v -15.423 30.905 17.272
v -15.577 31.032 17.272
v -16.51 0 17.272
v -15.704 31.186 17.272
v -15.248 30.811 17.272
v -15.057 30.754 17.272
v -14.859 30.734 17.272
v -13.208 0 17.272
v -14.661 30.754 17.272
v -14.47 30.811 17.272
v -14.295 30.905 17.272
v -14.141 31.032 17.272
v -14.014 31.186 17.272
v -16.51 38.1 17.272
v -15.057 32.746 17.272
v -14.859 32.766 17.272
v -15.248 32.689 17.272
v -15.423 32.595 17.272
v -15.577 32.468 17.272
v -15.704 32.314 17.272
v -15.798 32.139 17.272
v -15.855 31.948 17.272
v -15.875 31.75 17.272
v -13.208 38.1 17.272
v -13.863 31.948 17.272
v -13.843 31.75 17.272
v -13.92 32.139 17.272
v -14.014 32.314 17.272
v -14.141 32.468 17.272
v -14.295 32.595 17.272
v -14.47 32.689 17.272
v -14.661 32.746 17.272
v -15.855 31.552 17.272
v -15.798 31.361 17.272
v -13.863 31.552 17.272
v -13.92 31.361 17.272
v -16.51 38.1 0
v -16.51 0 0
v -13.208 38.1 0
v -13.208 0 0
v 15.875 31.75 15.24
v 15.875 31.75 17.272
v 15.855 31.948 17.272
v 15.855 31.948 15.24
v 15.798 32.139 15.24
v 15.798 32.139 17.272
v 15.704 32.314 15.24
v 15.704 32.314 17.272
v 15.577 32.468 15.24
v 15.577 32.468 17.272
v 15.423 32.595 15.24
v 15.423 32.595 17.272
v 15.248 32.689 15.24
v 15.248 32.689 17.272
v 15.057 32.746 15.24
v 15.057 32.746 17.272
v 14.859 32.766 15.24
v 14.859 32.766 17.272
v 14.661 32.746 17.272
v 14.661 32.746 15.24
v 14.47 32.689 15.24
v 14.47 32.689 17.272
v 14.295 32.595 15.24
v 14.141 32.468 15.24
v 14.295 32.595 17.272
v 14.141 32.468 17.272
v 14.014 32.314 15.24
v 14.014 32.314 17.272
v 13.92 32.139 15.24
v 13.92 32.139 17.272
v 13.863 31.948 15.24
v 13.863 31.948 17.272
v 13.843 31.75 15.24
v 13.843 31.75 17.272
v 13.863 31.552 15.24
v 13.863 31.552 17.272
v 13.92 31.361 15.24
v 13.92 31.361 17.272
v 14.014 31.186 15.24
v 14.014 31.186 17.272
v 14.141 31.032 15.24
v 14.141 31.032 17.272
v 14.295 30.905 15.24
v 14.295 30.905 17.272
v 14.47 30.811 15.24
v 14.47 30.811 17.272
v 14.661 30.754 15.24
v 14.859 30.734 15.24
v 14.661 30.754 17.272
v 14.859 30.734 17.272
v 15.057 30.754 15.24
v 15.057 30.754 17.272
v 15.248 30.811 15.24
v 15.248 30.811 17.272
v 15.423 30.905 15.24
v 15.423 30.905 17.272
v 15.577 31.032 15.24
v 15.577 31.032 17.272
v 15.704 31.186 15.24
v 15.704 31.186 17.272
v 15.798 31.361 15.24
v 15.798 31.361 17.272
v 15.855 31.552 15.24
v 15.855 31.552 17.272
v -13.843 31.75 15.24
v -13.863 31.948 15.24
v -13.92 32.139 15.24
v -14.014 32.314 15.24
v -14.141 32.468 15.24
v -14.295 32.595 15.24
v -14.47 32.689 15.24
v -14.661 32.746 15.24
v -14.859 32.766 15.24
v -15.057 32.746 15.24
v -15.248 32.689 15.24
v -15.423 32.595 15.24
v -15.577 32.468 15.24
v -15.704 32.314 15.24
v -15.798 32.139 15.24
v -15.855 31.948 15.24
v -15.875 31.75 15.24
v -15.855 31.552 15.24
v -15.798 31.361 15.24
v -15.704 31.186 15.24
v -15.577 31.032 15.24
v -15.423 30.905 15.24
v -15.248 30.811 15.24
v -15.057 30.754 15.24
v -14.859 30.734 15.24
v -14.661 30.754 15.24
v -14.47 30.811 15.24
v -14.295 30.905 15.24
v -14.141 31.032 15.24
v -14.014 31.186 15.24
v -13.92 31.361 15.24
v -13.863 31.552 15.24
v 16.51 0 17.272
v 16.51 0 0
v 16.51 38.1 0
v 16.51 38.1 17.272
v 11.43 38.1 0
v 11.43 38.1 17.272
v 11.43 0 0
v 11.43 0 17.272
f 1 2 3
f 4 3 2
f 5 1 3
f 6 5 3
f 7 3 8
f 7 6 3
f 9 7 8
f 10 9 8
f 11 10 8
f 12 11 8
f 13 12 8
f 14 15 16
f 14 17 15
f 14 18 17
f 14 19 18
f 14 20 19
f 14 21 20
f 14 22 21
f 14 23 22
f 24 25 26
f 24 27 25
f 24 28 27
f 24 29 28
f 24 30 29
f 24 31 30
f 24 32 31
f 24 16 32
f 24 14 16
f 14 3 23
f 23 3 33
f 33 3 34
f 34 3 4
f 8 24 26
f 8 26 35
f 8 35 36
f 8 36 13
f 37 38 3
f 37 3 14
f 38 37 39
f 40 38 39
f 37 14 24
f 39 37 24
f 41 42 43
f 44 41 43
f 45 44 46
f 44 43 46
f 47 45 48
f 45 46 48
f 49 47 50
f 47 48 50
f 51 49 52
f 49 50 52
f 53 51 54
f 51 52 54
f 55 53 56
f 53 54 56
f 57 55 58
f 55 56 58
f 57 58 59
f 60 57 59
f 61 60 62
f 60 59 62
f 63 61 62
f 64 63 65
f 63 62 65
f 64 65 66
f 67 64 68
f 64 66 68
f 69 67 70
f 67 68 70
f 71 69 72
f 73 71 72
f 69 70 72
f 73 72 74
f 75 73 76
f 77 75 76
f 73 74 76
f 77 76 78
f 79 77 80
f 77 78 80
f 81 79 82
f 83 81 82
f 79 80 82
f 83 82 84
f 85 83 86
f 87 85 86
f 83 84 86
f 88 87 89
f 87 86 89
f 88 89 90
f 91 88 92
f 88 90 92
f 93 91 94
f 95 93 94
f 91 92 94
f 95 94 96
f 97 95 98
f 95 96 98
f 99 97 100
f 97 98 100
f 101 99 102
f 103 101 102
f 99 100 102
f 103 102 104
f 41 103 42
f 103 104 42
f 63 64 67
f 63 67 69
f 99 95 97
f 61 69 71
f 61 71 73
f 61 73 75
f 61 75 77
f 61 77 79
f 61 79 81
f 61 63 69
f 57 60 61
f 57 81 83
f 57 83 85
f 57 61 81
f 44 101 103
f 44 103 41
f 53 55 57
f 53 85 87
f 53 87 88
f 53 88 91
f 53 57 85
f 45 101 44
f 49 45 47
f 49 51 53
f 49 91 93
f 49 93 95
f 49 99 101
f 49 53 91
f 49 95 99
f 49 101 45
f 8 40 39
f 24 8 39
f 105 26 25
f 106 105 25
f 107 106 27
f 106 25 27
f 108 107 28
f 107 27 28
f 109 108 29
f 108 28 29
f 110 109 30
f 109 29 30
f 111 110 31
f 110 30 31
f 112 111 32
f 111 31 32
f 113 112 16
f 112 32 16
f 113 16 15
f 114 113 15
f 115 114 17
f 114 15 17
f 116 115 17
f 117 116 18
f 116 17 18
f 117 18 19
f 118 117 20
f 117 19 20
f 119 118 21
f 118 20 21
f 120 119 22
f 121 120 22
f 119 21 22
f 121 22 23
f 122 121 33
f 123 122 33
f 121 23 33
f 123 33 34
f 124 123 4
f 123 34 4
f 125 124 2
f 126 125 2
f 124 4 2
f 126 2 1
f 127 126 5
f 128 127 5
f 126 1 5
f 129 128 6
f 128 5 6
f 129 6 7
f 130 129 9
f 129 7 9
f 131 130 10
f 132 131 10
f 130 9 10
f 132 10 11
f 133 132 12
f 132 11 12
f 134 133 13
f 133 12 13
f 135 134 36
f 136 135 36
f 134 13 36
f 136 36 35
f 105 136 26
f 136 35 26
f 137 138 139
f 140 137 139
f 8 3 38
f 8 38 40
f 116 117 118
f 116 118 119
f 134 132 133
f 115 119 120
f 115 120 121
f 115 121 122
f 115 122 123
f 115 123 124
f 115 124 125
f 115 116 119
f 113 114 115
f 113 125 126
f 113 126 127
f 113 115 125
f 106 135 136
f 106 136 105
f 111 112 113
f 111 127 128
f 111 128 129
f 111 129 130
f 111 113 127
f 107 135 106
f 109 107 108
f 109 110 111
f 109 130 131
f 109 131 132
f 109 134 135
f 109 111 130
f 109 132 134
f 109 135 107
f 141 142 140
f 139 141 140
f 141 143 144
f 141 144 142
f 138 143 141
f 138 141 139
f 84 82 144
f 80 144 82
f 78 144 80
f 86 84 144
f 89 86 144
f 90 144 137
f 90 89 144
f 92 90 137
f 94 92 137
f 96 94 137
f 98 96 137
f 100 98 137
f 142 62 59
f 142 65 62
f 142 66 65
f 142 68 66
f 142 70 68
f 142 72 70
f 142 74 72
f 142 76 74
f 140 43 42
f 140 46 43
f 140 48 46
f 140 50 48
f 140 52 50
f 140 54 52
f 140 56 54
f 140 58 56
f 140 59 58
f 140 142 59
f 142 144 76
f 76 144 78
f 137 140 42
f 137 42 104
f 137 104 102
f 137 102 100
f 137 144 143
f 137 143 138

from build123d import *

# Parameters (mm, degrees)
SKETCH2_W             = 3.302
SKETCH2_H             = 38.1
BOSS_EXTRUDE1_DEPTH   = 17.272
SKETCH2_W_2           = 5.08
BOSS_EXTRUDE1_2_DEPTH = 17.272
SKETCH3_R             = 1.016
CUT_EXTRUDE1_DEPTH    = 2.032


with BuildPart() as part:
    # Sketch2 → Boss-Extrude1 (new body)
    with BuildSketch(Plane.XY):
        with Locations((-14.859, 19.05)):
            Rectangle(SKETCH2_W, SKETCH2_H)
    extrude(amount=BOSS_EXTRUDE1_DEPTH)


with BuildPart() as body_2:
    # Sketch2 → Boss-Extrude1 2 (new body)
    with BuildSketch(Plane.XY):
        with Locations((13.97, 19.05)):
            Rectangle(SKETCH2_W_2, SKETCH2_H)
    extrude(amount=BOSS_EXTRUDE1_2_DEPTH)


with BuildPart() as cut_extrude1_tool:
    # Sketch3 → Cut-Extrude1 (new body)
    with BuildSketch(Plane.XY.offset(17.272)):
        with Locations((-14.859, 31.75)):
            Circle(SKETCH3_R)
        with Locations((14.859, 31.75)):
            Circle(SKETCH3_R)
    extrude(amount=-CUT_EXTRUDE1_DEPTH)


with BuildPart() as part_1:
    add(part.part)

    # Cut-Extrude1: cut by cut_extrude1_tool
    add(cut_extrude1_tool.part, mode=Mode.SUBTRACT)


with BuildPart() as body_2_1:
    add(body_2.part)

    # Cut-Extrude1: cut by cut_extrude1_tool
    add(cut_extrude1_tool.part, mode=Mode.SUBTRACT)


solid = Compound([part_1.part, body_2_1.part])
